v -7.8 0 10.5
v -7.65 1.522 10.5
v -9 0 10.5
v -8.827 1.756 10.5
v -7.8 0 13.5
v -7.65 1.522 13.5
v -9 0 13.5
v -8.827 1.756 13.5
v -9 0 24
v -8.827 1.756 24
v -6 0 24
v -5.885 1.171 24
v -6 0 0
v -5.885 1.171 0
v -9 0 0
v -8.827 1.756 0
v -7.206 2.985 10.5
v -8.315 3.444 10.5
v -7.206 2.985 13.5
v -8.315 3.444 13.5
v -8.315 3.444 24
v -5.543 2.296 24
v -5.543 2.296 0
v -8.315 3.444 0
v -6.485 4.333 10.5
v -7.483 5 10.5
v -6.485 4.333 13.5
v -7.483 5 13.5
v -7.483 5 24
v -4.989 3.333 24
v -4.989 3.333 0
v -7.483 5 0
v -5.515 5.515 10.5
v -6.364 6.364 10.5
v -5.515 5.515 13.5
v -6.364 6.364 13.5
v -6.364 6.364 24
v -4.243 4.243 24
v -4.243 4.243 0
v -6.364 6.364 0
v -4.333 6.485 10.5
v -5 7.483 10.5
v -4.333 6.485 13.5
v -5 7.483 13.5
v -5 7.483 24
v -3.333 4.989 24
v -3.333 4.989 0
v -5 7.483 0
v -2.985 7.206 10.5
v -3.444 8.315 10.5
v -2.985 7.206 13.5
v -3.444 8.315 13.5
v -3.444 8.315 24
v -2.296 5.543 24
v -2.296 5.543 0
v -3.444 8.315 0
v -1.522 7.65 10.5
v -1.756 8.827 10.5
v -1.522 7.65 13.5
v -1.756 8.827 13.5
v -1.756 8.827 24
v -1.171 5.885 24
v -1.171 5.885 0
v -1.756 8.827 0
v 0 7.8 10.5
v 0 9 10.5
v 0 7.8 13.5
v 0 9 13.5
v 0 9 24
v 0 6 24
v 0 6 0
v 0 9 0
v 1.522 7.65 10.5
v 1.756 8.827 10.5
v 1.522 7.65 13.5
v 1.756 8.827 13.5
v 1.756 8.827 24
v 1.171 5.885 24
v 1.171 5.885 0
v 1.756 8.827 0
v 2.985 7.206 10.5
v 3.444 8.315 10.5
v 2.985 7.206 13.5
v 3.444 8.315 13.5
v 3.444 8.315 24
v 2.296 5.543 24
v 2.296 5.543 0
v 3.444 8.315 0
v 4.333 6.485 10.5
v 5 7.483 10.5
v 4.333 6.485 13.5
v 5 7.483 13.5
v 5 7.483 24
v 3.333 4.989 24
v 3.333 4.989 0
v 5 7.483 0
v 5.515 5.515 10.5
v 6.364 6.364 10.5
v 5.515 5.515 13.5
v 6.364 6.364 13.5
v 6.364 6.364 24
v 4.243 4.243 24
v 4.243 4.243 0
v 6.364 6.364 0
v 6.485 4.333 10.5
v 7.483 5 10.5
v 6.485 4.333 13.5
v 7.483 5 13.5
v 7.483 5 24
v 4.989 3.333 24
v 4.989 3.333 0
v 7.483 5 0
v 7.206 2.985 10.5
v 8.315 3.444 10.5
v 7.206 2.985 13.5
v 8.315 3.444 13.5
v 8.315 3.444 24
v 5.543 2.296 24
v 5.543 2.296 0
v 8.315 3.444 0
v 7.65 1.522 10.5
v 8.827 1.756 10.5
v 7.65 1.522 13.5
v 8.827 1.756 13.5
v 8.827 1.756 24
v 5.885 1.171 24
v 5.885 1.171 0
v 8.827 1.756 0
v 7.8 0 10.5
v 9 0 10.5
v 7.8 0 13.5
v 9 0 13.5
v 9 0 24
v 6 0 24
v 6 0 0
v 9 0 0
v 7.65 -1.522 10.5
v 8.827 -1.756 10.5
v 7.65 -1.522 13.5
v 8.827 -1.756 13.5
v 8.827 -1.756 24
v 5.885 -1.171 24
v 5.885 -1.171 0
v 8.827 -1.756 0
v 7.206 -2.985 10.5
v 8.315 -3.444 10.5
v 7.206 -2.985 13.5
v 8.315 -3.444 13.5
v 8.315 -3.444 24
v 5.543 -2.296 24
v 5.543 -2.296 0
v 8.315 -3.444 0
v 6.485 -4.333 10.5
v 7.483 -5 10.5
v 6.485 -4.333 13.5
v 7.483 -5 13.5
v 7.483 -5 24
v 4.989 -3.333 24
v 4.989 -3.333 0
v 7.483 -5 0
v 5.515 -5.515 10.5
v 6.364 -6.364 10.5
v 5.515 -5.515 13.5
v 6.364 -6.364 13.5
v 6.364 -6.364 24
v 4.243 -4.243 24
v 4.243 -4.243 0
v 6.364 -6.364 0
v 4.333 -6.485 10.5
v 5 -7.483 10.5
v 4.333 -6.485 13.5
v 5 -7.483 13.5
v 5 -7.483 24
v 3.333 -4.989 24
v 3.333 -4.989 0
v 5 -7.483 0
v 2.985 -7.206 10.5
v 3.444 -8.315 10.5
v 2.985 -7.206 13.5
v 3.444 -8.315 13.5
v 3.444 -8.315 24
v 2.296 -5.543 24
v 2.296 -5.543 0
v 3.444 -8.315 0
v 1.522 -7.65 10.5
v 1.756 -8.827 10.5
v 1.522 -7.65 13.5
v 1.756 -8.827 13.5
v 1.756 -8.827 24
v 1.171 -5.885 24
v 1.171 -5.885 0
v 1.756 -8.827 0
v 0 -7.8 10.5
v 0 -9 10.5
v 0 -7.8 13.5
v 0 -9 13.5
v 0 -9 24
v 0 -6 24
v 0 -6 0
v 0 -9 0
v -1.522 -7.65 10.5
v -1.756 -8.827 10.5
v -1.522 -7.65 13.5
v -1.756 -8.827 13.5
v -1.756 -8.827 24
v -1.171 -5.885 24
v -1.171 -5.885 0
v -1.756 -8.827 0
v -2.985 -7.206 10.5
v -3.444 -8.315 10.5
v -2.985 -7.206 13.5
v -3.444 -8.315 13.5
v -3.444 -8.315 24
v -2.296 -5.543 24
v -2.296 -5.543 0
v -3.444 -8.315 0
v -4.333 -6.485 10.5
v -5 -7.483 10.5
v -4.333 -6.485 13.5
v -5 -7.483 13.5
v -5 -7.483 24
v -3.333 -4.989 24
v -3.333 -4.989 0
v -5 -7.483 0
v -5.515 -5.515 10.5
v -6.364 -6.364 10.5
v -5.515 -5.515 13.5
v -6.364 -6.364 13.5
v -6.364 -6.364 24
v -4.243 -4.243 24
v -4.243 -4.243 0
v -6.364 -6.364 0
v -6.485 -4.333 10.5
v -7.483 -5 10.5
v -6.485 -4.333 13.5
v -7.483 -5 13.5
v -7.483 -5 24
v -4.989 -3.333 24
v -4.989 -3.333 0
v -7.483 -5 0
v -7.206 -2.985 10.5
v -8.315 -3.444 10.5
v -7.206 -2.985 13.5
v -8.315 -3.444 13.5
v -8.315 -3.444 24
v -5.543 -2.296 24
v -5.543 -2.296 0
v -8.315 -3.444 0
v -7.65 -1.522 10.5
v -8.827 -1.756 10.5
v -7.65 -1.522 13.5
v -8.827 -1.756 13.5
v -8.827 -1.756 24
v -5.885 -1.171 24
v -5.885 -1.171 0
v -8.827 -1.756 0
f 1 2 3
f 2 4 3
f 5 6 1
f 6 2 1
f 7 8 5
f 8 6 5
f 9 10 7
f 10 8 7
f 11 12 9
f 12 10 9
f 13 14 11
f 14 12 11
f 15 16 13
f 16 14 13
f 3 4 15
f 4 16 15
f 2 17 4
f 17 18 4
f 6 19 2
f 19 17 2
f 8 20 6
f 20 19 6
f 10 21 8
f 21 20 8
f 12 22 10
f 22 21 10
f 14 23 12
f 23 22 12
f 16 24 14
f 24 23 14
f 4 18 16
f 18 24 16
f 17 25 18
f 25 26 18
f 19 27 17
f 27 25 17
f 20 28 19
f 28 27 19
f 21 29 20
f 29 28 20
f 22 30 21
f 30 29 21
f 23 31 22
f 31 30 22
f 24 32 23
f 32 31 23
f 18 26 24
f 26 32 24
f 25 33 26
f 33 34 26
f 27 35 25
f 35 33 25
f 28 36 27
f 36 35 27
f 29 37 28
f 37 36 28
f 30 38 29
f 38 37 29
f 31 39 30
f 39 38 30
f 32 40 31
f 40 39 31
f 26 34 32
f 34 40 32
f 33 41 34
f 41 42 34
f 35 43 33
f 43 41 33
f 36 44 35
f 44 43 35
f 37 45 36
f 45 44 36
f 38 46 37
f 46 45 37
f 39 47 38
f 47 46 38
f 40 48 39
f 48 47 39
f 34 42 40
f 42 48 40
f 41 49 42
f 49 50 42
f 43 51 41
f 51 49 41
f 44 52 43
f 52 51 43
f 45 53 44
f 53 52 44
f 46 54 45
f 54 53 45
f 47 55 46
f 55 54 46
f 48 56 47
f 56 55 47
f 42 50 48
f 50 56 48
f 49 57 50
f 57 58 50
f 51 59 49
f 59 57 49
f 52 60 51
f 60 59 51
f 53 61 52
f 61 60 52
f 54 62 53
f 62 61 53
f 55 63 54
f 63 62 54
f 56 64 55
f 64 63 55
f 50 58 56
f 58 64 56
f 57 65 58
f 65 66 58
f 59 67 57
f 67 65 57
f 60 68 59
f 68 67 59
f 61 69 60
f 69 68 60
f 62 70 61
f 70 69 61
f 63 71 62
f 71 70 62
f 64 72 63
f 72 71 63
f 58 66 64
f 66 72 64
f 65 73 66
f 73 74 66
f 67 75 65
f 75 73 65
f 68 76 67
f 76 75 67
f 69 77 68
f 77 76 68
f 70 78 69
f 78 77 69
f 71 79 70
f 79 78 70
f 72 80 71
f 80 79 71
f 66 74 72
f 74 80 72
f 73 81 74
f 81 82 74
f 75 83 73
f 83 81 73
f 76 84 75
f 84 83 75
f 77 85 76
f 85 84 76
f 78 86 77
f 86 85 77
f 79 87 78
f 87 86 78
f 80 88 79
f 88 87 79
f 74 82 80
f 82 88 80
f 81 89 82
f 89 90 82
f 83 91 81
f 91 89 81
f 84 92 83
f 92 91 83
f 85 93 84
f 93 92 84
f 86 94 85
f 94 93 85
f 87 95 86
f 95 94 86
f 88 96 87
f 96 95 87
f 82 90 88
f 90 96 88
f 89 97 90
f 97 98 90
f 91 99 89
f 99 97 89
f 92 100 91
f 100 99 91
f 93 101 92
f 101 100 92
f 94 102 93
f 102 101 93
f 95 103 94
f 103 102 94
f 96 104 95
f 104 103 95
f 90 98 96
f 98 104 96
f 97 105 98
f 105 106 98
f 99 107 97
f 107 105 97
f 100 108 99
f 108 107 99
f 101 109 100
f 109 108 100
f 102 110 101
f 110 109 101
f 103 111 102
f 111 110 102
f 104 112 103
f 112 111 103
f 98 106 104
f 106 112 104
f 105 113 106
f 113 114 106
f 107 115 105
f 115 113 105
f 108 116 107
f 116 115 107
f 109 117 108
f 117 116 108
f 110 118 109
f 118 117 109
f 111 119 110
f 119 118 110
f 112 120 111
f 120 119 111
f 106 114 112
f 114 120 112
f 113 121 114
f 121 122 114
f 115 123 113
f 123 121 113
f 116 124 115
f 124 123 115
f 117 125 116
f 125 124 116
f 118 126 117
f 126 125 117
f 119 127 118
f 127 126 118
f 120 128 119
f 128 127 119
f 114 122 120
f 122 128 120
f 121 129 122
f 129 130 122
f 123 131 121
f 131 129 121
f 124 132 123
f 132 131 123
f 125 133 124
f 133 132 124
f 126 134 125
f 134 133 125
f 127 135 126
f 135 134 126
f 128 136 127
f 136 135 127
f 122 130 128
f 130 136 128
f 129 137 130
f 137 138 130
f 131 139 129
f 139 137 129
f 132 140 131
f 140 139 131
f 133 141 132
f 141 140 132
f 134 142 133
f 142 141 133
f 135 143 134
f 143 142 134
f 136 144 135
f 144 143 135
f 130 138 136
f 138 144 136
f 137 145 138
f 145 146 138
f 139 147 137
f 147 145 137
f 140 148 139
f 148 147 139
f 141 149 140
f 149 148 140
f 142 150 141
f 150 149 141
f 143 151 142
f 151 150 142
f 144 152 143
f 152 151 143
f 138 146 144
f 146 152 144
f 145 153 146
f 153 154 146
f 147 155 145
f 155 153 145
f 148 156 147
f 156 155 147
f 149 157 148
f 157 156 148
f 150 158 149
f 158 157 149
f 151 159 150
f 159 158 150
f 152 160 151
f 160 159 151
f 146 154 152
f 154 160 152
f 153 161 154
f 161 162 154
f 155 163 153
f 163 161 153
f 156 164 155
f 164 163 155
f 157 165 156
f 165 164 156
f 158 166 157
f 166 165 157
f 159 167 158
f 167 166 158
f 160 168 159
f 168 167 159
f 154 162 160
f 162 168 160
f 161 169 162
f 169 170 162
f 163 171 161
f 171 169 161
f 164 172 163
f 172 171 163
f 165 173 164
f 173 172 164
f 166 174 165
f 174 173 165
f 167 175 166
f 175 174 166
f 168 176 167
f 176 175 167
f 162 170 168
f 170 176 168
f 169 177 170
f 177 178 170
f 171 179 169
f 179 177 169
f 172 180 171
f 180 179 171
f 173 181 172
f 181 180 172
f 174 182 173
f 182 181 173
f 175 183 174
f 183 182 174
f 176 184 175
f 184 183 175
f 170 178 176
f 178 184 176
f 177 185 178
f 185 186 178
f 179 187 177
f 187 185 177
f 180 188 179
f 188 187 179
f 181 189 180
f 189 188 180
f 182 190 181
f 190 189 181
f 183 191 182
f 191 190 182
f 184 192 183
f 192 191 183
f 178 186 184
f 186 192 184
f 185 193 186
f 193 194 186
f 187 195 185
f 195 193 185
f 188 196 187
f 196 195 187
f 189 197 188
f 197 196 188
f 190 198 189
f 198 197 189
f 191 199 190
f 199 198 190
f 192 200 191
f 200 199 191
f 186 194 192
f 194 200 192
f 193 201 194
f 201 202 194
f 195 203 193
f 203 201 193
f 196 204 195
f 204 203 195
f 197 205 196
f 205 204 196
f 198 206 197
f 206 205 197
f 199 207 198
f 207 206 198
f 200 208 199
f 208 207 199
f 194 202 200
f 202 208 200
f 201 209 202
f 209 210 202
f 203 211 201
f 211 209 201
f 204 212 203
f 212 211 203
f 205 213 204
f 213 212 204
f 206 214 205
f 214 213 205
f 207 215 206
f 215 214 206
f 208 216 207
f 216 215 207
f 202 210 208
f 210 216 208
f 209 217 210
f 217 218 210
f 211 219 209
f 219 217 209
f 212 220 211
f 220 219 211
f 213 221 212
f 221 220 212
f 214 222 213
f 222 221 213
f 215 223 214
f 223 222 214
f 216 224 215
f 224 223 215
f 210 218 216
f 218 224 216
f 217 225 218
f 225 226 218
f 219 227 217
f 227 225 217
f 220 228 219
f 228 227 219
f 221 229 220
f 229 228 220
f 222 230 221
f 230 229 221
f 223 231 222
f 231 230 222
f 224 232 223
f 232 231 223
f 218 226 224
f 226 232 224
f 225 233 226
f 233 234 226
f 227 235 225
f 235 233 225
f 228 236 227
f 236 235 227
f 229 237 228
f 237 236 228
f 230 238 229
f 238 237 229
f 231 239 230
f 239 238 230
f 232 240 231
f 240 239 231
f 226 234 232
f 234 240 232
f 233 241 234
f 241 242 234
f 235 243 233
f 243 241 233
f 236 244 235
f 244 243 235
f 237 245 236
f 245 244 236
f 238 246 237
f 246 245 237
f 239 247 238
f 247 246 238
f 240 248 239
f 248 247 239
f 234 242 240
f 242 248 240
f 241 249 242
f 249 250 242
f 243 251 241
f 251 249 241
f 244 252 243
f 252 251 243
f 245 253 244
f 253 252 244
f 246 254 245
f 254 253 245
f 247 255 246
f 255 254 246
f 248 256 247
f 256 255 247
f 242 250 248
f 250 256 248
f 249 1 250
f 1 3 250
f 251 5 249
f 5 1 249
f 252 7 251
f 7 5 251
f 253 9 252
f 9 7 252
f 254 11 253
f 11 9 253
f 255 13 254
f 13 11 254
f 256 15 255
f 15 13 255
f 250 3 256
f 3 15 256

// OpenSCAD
$fn = 32;

// ----------------------------------------------------------------------
// Grooved revolve: stepped, bore R6
// ----------------------------------------------------------------------

// --- parameters (mm) ---
bore_r = 6;               // bore radius
outer_r = 9;              // outer radius of the body
total_h = 24;             // overall height, Z
wall = 3;                 // radial wall thickness
groove_w = 3;             // groove width
groove_d = 1.2;           // groove depth
grooves = 1;              // number of outer grooves
fit_tol = 0.02;           // declared fit tolerance (prompt contract)
free_tol = 0.2;           // declared free tolerance (prompt contract)

bbox_x = 2 * outer_r;  // full diameter
bore_d = 2 * bore_r;  // bore diameter
body_d = 2 * outer_r;  // body diameter
revolve_angle = 360;  // full turn around the Z axis

profile = [[6, 0], [9, 0], [9, 10.5], [7.8, 10.5], [7.8, 13.5], [9, 13.5], [9, 24], [6, 24]];  // primary outline, 8 points, counter clockwise

// --- the one profile operation ---
rotate_extrude(angle = revolve_angle) polygon(points = profile);
